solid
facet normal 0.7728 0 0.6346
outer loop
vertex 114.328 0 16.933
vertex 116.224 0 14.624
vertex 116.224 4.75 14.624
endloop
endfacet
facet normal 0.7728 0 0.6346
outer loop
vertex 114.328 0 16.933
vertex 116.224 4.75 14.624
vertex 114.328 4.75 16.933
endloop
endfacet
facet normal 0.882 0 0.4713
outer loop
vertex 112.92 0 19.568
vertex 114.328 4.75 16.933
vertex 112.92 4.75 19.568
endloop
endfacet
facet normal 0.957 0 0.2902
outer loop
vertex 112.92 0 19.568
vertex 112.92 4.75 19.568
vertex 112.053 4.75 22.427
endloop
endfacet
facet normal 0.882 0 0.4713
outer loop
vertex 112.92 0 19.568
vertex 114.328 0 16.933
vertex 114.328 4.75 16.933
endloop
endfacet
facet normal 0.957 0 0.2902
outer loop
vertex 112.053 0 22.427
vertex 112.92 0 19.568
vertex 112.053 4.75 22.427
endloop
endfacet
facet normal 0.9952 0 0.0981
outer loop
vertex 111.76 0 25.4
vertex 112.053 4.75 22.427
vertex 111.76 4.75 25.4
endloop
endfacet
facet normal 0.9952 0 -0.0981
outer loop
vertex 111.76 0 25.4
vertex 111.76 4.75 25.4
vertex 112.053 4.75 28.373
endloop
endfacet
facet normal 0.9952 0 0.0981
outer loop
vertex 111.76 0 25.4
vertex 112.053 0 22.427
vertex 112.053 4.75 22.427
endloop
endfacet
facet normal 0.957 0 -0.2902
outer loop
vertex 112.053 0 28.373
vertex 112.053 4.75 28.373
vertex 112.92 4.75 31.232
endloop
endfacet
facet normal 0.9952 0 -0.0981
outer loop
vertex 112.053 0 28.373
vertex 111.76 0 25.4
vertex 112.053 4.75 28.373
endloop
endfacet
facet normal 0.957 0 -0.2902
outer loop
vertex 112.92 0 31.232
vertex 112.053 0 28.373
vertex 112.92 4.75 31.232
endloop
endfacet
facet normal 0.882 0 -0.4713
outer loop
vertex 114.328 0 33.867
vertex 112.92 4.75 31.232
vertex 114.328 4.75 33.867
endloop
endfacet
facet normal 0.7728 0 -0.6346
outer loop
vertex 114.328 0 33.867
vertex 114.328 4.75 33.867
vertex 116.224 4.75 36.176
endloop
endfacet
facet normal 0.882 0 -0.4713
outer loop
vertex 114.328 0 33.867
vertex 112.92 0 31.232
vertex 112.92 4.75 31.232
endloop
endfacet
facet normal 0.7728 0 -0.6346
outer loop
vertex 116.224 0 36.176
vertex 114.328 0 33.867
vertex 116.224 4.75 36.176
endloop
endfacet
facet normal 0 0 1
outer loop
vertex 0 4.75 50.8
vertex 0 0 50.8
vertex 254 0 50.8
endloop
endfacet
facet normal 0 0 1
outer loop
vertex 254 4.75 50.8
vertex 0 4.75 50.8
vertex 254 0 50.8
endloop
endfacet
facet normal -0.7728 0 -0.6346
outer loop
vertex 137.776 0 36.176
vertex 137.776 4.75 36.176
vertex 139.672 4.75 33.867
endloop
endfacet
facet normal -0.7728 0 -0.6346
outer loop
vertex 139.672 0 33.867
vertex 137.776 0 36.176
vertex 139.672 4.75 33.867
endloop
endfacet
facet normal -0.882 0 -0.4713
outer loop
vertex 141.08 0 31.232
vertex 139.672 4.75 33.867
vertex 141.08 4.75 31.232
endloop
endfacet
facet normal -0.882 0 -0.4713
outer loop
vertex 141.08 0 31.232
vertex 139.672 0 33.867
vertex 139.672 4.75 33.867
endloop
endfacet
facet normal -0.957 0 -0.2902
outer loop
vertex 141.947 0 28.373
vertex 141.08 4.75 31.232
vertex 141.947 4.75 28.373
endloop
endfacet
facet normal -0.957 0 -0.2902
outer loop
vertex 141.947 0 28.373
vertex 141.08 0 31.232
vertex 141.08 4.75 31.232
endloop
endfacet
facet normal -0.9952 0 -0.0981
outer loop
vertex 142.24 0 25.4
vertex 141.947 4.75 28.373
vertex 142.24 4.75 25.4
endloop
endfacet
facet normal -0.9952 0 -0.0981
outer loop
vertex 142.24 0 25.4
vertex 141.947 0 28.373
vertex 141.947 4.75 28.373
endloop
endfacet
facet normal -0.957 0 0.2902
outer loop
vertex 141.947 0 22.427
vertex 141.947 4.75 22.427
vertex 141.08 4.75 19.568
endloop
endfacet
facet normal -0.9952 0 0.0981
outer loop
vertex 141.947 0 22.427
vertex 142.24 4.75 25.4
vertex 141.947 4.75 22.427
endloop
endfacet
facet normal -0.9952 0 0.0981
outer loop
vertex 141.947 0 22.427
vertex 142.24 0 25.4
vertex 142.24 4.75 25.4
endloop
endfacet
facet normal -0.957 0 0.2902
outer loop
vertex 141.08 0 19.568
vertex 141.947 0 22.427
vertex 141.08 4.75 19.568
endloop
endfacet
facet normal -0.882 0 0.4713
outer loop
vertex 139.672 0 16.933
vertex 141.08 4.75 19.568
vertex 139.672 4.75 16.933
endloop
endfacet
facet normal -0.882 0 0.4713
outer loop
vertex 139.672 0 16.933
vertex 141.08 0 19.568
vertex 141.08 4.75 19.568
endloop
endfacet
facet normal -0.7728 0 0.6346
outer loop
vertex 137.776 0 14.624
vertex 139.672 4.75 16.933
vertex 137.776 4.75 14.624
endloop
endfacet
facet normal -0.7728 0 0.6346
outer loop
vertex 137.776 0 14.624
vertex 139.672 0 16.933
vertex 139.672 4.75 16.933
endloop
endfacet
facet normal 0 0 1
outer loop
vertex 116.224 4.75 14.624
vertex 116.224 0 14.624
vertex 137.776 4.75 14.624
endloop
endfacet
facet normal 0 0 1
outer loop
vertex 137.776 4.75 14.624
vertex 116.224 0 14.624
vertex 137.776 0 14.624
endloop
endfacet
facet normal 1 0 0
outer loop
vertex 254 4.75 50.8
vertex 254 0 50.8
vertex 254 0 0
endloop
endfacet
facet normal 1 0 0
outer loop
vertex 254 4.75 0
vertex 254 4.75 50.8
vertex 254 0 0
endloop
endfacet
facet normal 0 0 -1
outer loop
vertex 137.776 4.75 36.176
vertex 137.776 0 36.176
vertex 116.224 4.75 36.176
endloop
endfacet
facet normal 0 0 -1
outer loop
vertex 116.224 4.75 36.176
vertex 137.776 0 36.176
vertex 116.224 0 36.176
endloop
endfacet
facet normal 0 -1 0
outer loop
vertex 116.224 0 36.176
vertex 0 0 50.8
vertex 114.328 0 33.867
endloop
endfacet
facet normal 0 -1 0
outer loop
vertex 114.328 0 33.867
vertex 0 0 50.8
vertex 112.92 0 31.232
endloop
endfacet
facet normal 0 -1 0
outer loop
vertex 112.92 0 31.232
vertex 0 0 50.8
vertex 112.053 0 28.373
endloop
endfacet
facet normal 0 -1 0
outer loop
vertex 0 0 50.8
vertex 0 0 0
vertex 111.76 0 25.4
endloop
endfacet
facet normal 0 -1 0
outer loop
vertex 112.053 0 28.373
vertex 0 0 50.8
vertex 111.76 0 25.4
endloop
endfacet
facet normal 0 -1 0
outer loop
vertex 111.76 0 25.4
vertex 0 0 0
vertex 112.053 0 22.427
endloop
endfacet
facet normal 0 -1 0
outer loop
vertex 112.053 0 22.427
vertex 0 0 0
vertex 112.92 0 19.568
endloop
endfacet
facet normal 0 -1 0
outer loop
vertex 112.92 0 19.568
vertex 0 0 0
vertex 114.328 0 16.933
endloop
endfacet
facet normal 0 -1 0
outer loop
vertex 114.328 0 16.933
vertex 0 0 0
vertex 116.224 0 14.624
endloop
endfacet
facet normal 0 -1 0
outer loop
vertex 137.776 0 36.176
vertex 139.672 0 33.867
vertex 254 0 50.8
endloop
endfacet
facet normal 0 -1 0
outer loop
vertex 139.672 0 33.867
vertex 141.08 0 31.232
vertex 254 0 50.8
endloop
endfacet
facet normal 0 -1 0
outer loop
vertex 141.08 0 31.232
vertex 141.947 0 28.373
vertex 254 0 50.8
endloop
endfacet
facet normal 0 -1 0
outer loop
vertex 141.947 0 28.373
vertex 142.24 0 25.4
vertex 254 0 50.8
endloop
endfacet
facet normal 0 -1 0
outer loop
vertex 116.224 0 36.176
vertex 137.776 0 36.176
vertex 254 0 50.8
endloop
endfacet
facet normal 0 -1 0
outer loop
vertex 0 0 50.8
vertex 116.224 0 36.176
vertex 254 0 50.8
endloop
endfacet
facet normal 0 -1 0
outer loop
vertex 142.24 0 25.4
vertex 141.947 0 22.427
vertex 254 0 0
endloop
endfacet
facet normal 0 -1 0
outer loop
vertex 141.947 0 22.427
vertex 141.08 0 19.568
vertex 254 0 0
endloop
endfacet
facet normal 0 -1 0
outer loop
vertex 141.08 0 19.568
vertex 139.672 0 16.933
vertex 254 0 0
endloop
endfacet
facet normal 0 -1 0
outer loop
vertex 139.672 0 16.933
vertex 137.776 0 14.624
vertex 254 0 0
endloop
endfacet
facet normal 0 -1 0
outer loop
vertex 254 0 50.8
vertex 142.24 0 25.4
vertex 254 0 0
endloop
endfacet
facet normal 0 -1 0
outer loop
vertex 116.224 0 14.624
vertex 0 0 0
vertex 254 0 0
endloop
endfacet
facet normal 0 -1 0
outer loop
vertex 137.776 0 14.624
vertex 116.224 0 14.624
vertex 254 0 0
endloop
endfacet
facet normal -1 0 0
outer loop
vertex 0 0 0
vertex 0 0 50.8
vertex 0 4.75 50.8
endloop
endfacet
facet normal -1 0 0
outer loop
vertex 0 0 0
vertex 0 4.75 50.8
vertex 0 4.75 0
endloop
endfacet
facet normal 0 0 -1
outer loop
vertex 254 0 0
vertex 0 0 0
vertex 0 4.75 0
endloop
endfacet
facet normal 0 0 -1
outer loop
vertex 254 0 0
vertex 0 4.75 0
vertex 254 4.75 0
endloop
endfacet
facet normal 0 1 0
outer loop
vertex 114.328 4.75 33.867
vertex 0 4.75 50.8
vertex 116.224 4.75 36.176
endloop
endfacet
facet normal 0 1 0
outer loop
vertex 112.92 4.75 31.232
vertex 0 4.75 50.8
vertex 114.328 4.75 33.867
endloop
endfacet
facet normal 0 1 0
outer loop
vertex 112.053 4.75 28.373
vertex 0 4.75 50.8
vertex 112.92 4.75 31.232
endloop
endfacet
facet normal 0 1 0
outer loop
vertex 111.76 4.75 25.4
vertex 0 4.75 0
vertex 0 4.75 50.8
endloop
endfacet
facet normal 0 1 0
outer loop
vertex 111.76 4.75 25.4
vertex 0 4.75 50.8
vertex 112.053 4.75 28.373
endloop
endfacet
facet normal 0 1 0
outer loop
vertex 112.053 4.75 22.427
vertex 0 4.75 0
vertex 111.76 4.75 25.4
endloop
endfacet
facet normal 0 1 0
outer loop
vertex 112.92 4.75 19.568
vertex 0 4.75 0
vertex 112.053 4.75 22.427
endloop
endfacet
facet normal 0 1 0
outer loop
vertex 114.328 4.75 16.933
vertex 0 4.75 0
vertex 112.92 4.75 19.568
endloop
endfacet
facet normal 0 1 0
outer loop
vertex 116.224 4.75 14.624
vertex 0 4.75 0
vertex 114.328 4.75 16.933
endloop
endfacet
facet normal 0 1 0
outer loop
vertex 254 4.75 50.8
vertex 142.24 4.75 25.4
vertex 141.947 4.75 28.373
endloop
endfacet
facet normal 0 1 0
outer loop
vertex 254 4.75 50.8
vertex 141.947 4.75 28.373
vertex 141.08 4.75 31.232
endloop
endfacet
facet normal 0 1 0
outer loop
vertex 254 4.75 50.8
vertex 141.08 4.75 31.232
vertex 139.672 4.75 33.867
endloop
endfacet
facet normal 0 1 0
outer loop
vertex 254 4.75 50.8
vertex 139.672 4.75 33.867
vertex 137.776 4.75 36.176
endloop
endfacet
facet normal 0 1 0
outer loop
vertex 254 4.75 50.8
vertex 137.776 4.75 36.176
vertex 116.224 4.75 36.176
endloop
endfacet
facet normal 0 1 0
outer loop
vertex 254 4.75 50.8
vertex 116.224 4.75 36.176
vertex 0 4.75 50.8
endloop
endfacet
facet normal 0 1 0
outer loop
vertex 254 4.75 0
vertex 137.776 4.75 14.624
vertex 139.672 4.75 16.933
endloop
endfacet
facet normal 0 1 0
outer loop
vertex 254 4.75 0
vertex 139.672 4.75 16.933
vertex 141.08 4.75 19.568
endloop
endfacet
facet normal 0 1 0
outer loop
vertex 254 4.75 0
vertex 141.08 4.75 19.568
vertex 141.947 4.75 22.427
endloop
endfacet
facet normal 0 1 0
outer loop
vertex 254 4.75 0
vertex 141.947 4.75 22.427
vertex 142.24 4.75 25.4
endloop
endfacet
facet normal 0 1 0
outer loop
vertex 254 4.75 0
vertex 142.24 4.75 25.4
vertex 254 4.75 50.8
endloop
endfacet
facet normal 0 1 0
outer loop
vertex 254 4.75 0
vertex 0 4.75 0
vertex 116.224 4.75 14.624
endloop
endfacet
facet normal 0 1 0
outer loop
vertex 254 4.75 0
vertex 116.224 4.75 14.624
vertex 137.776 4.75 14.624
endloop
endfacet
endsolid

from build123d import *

# Parameters (mm, degrees)
SKETCH1_W           = 254
SKETCH1_H           = 50.8
SKETCH1_R           = 15.24
BOSS_EXTRUDE1_DEPTH = 4.7498


with BuildPart() as part:
    # Sketch1 → Boss-Extrude1 (new body)
    # profile 1 of 3: a face of its own
    with BuildSketch(Plane(origin=(0, 0, 0), x_dir=(1, 0, 0), z_dir=(0, 1, 0))):
        with Locations((127, -25.4)):
            Rectangle(SKETCH1_W, SKETCH1_H)
        with Locations((127, -25.4)):
            Circle(SKETCH1_R, mode=Mode.SUBTRACT)
    # profile 2 of 3: a face of its own
    with BuildSketch(Plane(origin=(0, 0, 0), x_dir=(1, 0, 0), z_dir=(0, 1, 0))):
        with BuildLine():
            ThreePointArc((137.776307345, -14.623692655), (127, -10.16), (116.223692655, -14.623692655))
            Line((116.223692655, -14.623692655), (137.776307345, -14.623692655))
        make_face()
    # profile 3 of 3: a face of its own
    with BuildSketch(Plane(origin=(0, 0, 0), x_dir=(1, 0, 0), z_dir=(0, 1, 0))):
        with BuildLine():
            ThreePointArc((116.223692655, -36.176307345), (127, -40.64), (137.776307345, -36.176307345))
            Line((137.776307345, -36.176307345), (116.223692655, -36.176307345))
        make_face()
    extrude(amount=BOSS_EXTRUDE1_DEPTH)


solid = part.part
